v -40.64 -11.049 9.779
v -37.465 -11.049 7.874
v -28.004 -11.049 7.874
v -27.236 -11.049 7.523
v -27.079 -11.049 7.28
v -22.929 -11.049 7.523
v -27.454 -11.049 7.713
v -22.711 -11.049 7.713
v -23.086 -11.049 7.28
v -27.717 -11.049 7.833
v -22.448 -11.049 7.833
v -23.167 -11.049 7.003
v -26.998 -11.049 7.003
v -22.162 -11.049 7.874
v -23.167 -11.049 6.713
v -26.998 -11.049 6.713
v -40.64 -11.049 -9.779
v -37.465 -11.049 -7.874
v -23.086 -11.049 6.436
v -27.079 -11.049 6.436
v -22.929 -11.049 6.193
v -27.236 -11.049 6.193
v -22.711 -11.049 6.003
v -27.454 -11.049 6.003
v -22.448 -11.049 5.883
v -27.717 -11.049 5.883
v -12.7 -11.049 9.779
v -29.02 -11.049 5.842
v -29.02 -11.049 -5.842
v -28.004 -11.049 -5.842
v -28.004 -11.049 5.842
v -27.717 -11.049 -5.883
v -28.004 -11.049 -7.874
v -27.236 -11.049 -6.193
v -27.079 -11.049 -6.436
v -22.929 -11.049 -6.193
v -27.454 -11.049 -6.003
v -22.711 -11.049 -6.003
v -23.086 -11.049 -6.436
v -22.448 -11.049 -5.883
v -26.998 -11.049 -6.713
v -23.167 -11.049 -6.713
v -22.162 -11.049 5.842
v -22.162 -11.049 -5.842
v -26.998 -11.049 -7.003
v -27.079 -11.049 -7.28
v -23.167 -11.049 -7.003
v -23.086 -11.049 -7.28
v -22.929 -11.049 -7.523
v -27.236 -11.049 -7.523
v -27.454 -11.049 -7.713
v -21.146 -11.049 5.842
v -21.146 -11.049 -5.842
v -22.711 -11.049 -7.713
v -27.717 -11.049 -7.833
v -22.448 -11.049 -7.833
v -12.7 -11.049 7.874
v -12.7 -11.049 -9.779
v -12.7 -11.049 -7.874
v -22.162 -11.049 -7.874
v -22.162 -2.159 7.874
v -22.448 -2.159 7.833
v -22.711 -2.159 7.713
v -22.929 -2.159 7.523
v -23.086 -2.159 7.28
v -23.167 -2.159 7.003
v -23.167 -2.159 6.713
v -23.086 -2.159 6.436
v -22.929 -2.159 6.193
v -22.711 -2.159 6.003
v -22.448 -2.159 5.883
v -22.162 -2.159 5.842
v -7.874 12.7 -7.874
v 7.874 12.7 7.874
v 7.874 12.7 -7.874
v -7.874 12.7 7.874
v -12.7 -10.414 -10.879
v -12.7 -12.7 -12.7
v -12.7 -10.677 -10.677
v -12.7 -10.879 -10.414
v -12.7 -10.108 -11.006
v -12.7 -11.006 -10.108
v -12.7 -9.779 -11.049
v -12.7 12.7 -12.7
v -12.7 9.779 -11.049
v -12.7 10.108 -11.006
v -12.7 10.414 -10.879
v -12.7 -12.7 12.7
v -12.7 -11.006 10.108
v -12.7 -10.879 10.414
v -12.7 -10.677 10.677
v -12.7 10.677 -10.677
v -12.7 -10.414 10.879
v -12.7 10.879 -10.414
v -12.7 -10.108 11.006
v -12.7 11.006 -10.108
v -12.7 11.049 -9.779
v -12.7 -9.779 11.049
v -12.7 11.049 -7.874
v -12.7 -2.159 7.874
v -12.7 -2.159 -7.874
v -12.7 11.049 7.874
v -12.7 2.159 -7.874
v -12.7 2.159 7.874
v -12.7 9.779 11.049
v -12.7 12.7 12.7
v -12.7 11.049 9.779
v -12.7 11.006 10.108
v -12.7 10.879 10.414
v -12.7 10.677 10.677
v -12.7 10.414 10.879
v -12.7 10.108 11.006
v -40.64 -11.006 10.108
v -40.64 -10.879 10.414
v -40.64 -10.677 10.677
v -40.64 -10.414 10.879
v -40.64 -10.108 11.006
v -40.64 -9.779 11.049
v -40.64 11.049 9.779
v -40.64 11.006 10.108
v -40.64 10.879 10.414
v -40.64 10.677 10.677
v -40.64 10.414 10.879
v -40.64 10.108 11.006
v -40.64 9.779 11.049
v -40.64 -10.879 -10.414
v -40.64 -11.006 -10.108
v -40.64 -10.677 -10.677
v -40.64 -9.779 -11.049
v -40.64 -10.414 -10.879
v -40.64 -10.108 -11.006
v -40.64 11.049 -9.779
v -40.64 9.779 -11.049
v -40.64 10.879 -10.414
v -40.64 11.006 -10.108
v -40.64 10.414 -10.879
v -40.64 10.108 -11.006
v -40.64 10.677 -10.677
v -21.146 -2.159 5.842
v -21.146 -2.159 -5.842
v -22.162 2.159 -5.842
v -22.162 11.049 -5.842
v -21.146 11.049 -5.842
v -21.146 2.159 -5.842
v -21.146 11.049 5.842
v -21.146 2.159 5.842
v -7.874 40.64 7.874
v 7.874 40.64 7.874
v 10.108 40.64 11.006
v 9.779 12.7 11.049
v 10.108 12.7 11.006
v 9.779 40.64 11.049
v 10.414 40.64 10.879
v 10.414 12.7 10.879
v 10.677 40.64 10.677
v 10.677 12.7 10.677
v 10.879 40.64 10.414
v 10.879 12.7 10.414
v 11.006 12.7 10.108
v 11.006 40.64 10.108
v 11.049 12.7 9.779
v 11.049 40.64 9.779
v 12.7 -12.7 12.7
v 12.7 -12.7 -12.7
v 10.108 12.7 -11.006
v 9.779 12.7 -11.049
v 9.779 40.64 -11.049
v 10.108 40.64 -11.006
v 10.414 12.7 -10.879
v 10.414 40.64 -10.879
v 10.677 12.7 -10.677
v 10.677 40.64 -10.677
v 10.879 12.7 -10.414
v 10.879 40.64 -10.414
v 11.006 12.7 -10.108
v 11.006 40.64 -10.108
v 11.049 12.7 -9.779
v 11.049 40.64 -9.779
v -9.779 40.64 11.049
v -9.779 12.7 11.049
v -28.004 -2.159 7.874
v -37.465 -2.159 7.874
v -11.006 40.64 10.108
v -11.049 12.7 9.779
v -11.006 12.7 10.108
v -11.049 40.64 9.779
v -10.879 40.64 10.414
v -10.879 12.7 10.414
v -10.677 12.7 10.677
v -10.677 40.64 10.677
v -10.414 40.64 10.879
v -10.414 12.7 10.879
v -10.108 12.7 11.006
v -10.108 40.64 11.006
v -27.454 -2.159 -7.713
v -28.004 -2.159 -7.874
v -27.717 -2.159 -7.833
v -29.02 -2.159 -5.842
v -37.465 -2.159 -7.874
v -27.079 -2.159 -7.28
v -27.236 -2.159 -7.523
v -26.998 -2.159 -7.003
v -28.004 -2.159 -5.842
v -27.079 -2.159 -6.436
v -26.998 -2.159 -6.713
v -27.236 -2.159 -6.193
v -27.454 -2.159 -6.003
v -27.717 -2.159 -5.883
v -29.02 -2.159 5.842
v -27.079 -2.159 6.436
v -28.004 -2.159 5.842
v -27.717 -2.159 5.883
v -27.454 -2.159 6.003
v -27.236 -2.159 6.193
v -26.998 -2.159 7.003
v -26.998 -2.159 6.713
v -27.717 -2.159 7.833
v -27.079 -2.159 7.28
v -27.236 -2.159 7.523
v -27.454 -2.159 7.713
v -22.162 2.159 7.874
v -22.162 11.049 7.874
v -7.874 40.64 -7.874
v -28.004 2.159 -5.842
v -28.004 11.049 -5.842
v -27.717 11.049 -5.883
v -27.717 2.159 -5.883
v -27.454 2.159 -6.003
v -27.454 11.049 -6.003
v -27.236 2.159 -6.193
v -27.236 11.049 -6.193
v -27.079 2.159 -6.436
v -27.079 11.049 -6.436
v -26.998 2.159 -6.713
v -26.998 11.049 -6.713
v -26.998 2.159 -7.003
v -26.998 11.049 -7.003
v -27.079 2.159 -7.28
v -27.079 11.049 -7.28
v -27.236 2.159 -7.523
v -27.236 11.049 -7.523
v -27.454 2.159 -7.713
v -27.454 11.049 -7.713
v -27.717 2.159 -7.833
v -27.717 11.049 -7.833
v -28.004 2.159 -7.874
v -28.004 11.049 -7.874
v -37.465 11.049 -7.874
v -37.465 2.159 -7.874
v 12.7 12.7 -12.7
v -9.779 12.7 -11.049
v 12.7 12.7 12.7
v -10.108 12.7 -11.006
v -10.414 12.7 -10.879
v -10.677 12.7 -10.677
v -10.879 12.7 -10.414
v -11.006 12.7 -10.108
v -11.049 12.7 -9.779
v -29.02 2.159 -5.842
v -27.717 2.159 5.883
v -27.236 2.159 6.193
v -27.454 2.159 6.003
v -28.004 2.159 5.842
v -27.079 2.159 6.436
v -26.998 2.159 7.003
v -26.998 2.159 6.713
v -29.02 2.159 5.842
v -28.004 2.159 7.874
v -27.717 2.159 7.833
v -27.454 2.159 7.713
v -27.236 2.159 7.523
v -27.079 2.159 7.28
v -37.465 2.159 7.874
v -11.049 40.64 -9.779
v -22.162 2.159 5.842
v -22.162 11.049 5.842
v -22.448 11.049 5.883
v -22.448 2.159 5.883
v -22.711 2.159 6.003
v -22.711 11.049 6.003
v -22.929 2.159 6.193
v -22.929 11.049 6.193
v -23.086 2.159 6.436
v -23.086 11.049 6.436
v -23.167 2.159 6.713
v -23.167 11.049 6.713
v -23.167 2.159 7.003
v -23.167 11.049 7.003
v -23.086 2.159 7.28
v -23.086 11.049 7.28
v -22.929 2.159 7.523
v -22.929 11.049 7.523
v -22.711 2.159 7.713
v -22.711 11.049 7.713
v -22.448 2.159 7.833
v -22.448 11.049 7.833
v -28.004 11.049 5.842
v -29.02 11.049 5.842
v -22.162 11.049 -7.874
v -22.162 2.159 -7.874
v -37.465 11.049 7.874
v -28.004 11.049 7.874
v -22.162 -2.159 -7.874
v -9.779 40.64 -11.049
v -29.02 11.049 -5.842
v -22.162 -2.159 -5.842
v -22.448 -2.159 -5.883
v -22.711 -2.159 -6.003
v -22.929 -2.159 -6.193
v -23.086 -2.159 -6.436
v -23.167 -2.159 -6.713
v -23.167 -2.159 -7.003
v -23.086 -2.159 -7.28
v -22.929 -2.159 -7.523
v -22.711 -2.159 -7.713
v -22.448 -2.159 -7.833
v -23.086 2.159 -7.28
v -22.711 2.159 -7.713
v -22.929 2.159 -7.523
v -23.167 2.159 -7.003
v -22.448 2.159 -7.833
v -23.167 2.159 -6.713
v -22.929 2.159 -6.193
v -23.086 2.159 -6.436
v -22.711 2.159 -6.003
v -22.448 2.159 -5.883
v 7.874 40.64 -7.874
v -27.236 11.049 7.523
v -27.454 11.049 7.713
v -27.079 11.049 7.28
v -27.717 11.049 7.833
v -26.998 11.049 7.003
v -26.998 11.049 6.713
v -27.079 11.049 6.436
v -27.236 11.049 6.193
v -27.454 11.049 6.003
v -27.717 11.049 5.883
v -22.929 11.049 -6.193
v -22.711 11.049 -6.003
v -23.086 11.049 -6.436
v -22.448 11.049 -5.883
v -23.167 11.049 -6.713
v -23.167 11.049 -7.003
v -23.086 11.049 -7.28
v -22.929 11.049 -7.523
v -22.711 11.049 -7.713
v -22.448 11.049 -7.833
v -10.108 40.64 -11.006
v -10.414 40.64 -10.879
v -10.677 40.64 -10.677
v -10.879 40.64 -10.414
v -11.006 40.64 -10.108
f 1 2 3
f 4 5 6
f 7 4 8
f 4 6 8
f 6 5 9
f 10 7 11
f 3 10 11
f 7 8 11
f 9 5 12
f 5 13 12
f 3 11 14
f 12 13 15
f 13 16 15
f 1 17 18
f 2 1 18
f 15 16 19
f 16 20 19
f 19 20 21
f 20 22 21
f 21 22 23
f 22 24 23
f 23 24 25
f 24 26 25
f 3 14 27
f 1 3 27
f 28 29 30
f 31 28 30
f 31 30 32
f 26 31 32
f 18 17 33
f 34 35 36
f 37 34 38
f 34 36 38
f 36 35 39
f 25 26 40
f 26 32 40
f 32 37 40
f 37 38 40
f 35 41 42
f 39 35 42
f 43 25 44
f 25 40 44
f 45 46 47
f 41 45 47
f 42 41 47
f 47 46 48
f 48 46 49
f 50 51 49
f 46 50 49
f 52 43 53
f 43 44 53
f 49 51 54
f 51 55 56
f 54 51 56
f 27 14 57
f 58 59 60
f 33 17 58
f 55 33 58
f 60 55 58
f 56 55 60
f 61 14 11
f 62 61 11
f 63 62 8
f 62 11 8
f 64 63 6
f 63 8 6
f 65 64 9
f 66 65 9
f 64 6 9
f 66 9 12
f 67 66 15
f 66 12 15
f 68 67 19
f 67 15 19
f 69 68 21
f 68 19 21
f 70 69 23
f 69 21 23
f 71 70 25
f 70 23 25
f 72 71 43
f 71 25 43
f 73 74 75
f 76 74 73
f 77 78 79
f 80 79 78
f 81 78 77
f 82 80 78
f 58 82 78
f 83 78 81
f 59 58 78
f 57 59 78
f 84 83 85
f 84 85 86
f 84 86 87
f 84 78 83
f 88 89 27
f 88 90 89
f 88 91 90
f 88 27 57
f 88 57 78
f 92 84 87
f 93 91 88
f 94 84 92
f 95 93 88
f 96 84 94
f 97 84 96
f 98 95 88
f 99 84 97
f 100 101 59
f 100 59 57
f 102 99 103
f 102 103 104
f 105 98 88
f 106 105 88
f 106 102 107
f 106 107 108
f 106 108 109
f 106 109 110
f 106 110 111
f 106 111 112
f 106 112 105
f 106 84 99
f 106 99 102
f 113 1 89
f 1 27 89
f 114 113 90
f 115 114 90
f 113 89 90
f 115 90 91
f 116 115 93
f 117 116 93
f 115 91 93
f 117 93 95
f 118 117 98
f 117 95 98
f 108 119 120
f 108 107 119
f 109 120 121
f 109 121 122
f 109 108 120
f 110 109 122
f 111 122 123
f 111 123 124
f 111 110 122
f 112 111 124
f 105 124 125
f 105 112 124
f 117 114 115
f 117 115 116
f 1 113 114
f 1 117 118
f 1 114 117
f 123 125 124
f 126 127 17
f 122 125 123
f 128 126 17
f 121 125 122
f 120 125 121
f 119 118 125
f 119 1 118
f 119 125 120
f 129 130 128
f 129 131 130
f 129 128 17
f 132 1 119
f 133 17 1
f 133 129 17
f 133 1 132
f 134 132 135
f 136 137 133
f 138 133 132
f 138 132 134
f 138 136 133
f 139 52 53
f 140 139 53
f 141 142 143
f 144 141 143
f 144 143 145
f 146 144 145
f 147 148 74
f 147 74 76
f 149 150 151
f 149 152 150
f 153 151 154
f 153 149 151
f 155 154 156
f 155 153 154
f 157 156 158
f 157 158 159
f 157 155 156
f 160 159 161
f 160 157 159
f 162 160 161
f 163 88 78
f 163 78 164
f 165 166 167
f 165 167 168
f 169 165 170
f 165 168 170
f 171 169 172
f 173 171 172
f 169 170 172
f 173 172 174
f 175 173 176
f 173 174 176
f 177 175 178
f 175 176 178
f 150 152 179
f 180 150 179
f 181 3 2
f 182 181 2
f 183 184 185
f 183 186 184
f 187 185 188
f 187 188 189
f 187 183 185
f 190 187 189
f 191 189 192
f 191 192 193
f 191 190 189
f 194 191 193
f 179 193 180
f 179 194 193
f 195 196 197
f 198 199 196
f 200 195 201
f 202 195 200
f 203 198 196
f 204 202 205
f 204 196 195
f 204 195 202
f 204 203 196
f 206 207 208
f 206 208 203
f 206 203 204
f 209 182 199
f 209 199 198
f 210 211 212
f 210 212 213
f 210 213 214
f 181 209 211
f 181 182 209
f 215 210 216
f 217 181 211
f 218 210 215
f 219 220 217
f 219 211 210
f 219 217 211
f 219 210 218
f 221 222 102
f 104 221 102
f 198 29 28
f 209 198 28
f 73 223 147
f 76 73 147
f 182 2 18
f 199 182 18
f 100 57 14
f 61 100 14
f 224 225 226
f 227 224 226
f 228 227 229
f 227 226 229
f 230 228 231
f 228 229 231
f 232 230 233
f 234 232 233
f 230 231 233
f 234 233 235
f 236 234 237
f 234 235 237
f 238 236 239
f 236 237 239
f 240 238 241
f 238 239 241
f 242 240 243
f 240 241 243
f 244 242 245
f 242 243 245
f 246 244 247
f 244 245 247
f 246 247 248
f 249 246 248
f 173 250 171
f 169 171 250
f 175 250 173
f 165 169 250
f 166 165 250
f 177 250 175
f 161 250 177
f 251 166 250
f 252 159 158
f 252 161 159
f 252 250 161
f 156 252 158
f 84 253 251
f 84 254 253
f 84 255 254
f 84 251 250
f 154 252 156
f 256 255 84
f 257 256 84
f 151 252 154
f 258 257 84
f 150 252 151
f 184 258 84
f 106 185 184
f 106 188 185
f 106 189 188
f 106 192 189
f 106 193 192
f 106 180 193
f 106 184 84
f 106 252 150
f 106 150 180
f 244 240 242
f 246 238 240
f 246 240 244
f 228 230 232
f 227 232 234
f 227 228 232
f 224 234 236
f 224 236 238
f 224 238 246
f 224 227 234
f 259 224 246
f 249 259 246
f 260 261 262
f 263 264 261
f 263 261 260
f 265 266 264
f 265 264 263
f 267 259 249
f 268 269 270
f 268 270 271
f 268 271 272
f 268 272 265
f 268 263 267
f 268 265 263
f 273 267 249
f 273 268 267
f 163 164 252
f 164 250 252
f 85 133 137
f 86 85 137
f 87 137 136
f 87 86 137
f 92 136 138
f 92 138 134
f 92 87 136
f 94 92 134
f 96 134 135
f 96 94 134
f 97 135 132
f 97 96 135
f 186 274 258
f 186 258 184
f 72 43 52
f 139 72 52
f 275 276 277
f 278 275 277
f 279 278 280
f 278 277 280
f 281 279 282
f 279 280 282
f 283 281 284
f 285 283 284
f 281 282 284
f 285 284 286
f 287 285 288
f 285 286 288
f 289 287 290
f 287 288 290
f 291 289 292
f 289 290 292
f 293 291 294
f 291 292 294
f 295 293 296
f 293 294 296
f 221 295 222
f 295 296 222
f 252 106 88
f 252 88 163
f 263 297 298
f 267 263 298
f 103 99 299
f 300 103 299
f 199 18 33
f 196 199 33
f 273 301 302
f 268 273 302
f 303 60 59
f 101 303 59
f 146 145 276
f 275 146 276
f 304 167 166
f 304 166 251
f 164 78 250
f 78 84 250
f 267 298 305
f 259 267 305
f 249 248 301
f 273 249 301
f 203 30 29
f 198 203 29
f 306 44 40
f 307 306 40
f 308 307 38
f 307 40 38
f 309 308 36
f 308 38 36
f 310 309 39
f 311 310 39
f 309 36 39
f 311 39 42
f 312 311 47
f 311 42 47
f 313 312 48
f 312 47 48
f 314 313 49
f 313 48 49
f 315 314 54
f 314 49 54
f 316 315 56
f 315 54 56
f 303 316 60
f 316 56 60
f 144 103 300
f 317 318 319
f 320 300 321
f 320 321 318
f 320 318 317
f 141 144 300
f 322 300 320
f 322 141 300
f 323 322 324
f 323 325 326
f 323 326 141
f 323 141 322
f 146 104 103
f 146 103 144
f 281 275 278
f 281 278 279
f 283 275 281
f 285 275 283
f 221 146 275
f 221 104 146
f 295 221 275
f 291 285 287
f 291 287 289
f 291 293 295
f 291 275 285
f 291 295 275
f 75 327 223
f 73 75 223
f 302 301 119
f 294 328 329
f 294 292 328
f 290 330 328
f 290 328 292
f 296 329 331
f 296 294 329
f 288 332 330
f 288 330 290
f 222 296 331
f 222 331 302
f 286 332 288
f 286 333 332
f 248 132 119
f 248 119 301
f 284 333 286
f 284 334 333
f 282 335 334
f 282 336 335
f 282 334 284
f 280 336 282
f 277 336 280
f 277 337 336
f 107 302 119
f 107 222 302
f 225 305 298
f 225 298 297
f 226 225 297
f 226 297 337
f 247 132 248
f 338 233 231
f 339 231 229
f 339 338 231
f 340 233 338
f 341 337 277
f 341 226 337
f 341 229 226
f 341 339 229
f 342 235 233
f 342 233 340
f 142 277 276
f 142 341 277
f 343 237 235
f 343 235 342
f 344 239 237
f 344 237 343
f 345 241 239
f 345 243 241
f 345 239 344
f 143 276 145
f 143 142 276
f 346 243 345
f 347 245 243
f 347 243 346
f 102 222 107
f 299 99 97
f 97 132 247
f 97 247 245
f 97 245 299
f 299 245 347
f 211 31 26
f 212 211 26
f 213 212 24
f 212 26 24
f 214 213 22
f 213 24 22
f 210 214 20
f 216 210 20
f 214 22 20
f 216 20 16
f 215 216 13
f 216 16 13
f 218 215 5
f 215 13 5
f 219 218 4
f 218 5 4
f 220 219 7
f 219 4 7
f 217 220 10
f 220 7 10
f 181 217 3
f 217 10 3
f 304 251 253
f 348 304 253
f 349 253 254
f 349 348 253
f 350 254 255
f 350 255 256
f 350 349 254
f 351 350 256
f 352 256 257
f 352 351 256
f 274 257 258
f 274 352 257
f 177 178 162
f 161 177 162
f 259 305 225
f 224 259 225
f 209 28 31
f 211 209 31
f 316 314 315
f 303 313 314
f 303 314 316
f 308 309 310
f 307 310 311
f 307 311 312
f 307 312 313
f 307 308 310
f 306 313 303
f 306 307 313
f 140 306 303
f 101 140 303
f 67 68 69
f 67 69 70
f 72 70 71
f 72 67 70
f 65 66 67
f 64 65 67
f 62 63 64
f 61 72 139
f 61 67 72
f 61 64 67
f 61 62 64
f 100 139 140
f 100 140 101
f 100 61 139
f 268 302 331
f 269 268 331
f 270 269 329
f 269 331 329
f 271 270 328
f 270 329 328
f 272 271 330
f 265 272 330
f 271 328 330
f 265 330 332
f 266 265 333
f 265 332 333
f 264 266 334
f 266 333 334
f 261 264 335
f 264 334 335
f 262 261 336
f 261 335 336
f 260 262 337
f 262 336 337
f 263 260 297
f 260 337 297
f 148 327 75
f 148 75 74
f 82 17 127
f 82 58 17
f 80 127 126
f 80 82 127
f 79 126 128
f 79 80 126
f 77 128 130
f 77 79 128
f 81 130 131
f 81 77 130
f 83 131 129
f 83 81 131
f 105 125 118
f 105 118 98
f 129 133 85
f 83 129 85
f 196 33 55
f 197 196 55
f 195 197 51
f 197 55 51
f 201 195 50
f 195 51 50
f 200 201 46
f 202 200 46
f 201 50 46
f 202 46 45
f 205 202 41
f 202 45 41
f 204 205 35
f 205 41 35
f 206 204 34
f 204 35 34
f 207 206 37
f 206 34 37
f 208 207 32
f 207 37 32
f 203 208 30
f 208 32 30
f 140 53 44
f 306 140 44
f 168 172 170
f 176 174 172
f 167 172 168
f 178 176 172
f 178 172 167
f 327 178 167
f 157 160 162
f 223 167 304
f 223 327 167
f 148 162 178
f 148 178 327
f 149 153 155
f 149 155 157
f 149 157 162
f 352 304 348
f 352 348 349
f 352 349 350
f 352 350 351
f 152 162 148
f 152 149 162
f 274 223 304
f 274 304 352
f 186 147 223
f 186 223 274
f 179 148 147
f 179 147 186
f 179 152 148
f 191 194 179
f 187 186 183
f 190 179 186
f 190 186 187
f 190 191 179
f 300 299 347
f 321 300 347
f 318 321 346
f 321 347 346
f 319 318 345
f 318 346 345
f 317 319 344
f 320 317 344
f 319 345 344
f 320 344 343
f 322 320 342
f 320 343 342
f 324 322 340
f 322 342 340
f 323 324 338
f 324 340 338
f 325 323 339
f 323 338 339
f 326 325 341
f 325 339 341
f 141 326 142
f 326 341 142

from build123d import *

# Parameters (mm, degrees)
SKETCH1_W           = 25.4
SKETCH1_H           = 22.098
BOSS_EXTRUDE1_DEPTH = 1.651
SKETCH2_W           = 53.34
SKETCH2_H           = 22.098
BOSS_EXTRUDE2_DEPTH = 22.098
SKETCH3_W           = 25.4
SKETCH3_H           = 22.098
BOSS_EXTRUDE3_DEPTH = 1.651
SKETCH4_W           = 25.4
SKETCH4_H           = 25.4
BOSS_EXTRUDE4_DEPTH = 1.651
SKETCH5_W           = 25.4
SKETCH5_H           = 25.4
BOSS_EXTRUDE5_DEPTH = 1.651
CUT_EXTRUDE1_DEPTH  = 8.89
CUT_EXTRUDE2_DEPTH  = 8.89
CUT_EXTRUDE3_DEPTH  = 8.89
CUT_EXTRUDE4_DEPTH  = 8.89
SKETCH10_W          = 22.098
SKETCH10_H          = 22.098
BOSS_EXTRUDE6_DEPTH = 27.94
SKETCH11_W          = 15.748
SKETCH11_H          = 15.748
CUT_EXTRUDE5_DEPTH  = 27.94
FILLET1_R           = 1.27


with BuildPart() as part:
    # Sketch1 → Boss-Extrude1 (new body)
    with BuildSketch(Plane(origin=(0, 0, -12.7), x_dir=(-1, 0, 0), z_dir=(0, 0, -1))):
        Rectangle(SKETCH1_W, SKETCH1_H)
    extrude(amount=-BOSS_EXTRUDE1_DEPTH)

    # Sketch2 → Boss-Extrude2 (add)
    with BuildSketch(Plane.XY.offset(-11.049)):
        with Locations((-13.97, 0)):
            Rectangle(SKETCH2_W, SKETCH2_H)
    extrude(amount=BOSS_EXTRUDE2_DEPTH)

    # Sketch3 → Boss-Extrude3 (add)
    with BuildSketch(Plane.XY.offset(11.049)):
        Rectangle(SKETCH3_W, SKETCH3_H)
    extrude(amount=BOSS_EXTRUDE3_DEPTH)

    # Sketch4 → Boss-Extrude4 (add)
    with BuildSketch(Plane(origin=(0, 11.049, 0), x_dir=(-1, 0, 0), z_dir=(0, 1, 0))):
        Rectangle(SKETCH4_W, SKETCH4_H)
    extrude(amount=BOSS_EXTRUDE4_DEPTH)

    # Sketch5 → Boss-Extrude5 (add)
    with BuildSketch(Plane.XZ.offset(11.049)):
        Rectangle(SKETCH5_W, SKETCH5_H)
    extrude(amount=BOSS_EXTRUDE5_DEPTH)

    # Sketch6 → Cut-Extrude1 (cut)
    with BuildSketch(Plane(origin=(0, 11.049, 0), x_dir=(-1, 0, 0), z_dir=(0, 1, 0))):
        with BuildLine():
            Line((21.1455, 5.842), (22.1615, 5.842))
            ThreePointArc((22.1615, 5.842), (23.1775, 6.858), (22.1615, 7.874))
            Line((22.1615, 7.874), (12.7, 7.874))
            Line((12.7, 7.874), (12.7, -7.874))
            Line((12.7, -7.874), (22.1615, -7.874))
            ThreePointArc((22.1615, -7.874), (23.1775, -6.858), (22.1615, -5.842))
            Line((22.1615, -5.842), (21.1455, -5.842))
            Line((21.1455, -5.842), (21.1455, 5.842))
        make_face()
    extrude(amount=-CUT_EXTRUDE1_DEPTH, mode=Mode.SUBTRACT)

    # Sketch7 → Cut-Extrude2 (cut)
    with BuildSketch(Plane.XZ.offset(11.049)):
        with BuildLine():
            Line((-22.1615, 5.842), (-21.1455, 5.842))
            Line((-21.1455, 5.842), (-21.1455, -5.842))
            Line((-21.1455, -5.842), (-22.1615, -5.842))
            ThreePointArc((-22.1615, -5.842), (-23.1775, -6.858), (-22.1615, -7.874))
            Line((-22.1615, -7.874), (-12.7, -7.874))
            Line((-12.7, -7.874), (-12.7, 7.874))
            Line((-12.7, 7.874), (-22.1615, 7.874))
            ThreePointArc((-22.1615, 7.874), (-23.1775, 6.858), (-22.1615, 5.842))
        make_face()
    extrude(amount=-CUT_EXTRUDE2_DEPTH, mode=Mode.SUBTRACT)

    # Sketch8 → Cut-Extrude3 (cut)
    with BuildSketch(Plane(origin=(0, 11.049, 0), x_dir=(-1, 0, 0), z_dir=(0, 1, 0))):
        with BuildLine():
            Line((28.0035, -7.874), (37.465, -7.874))
            Line((37.465, -7.874), (37.465, 7.874))
            Line((37.465, 7.874), (28.0035, 7.874))
            ThreePointArc((28.0035, 7.874), (26.9875, 6.858), (28.0035, 5.842))
            Line((28.0035, 5.842), (29.0195, 5.842))
            Line((29.0195, 5.842), (29.0195, -5.842))
            Line((29.0195, -5.842), (28.0035, -5.842))
            ThreePointArc((28.0035, -5.842), (26.9875, -6.858), (28.0035, -7.874))
        make_face()
    extrude(amount=-CUT_EXTRUDE3_DEPTH, mode=Mode.SUBTRACT)

    # Sketch9 → Cut-Extrude4 (cut)
    with BuildSketch(Plane.XZ.offset(11.049)):
        with BuildLine():
            Line((-37.465, 7.874), (-37.465, -7.874))
            Line((-37.465, -7.874), (-28.0035, -7.874))
            ThreePointArc((-28.0035, -7.874), (-26.9875, -6.858), (-28.0035, -5.842))
            Line((-28.0035, -5.842), (-29.0195, -5.842))
            Line((-29.0195, -5.842), (-29.0195, 5.842))
            Line((-29.0195, 5.842), (-28.0035, 5.842))
            ThreePointArc((-28.0035, 5.842), (-26.9875, 6.858), (-28.0035, 7.874))
            Line((-28.0035, 7.874), (-37.465, 7.874))
        make_face()
    extrude(amount=-CUT_EXTRUDE4_DEPTH, mode=Mode.SUBTRACT)

    # Sketch10 → Boss-Extrude6 (add)
    with BuildSketch(Plane(origin=(0, 12.7, 0), x_dir=(-1, 0, 0), z_dir=(0, 1, 0))):
        Rectangle(SKETCH10_W, SKETCH10_H)
    extrude(amount=BOSS_EXTRUDE6_DEPTH)

    # Sketch11 → Cut-Extrude5 (cut)
    with BuildSketch(Plane(origin=(0, 40.64, 0), x_dir=(-1, 0, 0), z_dir=(0, 1, 0))):
        Rectangle(SKETCH11_W, SKETCH11_H)
    extrude(amount=-CUT_EXTRUDE5_DEPTH, mode=Mode.SUBTRACT)

    # Fillet1
    fillet1_edges = [part.edges().sort_by_distance(p)[0] for p in [
        (-26.67, 11.049, -11.049),
        (-26.67, -11.049, -11.049),
        (-26.67, -11.049, 11.049),
        (-11.049, 26.67, -11.049),
        (-11.049, 26.67, 11.049),
        (11.049, 26.67, 11.049),
        (11.049, 26.67, -11.049),
        (-26.67, 11.049, 11.049),
    ]]
    fillet(fillet1_edges, radius=FILLET1_R)


solid = part.part
